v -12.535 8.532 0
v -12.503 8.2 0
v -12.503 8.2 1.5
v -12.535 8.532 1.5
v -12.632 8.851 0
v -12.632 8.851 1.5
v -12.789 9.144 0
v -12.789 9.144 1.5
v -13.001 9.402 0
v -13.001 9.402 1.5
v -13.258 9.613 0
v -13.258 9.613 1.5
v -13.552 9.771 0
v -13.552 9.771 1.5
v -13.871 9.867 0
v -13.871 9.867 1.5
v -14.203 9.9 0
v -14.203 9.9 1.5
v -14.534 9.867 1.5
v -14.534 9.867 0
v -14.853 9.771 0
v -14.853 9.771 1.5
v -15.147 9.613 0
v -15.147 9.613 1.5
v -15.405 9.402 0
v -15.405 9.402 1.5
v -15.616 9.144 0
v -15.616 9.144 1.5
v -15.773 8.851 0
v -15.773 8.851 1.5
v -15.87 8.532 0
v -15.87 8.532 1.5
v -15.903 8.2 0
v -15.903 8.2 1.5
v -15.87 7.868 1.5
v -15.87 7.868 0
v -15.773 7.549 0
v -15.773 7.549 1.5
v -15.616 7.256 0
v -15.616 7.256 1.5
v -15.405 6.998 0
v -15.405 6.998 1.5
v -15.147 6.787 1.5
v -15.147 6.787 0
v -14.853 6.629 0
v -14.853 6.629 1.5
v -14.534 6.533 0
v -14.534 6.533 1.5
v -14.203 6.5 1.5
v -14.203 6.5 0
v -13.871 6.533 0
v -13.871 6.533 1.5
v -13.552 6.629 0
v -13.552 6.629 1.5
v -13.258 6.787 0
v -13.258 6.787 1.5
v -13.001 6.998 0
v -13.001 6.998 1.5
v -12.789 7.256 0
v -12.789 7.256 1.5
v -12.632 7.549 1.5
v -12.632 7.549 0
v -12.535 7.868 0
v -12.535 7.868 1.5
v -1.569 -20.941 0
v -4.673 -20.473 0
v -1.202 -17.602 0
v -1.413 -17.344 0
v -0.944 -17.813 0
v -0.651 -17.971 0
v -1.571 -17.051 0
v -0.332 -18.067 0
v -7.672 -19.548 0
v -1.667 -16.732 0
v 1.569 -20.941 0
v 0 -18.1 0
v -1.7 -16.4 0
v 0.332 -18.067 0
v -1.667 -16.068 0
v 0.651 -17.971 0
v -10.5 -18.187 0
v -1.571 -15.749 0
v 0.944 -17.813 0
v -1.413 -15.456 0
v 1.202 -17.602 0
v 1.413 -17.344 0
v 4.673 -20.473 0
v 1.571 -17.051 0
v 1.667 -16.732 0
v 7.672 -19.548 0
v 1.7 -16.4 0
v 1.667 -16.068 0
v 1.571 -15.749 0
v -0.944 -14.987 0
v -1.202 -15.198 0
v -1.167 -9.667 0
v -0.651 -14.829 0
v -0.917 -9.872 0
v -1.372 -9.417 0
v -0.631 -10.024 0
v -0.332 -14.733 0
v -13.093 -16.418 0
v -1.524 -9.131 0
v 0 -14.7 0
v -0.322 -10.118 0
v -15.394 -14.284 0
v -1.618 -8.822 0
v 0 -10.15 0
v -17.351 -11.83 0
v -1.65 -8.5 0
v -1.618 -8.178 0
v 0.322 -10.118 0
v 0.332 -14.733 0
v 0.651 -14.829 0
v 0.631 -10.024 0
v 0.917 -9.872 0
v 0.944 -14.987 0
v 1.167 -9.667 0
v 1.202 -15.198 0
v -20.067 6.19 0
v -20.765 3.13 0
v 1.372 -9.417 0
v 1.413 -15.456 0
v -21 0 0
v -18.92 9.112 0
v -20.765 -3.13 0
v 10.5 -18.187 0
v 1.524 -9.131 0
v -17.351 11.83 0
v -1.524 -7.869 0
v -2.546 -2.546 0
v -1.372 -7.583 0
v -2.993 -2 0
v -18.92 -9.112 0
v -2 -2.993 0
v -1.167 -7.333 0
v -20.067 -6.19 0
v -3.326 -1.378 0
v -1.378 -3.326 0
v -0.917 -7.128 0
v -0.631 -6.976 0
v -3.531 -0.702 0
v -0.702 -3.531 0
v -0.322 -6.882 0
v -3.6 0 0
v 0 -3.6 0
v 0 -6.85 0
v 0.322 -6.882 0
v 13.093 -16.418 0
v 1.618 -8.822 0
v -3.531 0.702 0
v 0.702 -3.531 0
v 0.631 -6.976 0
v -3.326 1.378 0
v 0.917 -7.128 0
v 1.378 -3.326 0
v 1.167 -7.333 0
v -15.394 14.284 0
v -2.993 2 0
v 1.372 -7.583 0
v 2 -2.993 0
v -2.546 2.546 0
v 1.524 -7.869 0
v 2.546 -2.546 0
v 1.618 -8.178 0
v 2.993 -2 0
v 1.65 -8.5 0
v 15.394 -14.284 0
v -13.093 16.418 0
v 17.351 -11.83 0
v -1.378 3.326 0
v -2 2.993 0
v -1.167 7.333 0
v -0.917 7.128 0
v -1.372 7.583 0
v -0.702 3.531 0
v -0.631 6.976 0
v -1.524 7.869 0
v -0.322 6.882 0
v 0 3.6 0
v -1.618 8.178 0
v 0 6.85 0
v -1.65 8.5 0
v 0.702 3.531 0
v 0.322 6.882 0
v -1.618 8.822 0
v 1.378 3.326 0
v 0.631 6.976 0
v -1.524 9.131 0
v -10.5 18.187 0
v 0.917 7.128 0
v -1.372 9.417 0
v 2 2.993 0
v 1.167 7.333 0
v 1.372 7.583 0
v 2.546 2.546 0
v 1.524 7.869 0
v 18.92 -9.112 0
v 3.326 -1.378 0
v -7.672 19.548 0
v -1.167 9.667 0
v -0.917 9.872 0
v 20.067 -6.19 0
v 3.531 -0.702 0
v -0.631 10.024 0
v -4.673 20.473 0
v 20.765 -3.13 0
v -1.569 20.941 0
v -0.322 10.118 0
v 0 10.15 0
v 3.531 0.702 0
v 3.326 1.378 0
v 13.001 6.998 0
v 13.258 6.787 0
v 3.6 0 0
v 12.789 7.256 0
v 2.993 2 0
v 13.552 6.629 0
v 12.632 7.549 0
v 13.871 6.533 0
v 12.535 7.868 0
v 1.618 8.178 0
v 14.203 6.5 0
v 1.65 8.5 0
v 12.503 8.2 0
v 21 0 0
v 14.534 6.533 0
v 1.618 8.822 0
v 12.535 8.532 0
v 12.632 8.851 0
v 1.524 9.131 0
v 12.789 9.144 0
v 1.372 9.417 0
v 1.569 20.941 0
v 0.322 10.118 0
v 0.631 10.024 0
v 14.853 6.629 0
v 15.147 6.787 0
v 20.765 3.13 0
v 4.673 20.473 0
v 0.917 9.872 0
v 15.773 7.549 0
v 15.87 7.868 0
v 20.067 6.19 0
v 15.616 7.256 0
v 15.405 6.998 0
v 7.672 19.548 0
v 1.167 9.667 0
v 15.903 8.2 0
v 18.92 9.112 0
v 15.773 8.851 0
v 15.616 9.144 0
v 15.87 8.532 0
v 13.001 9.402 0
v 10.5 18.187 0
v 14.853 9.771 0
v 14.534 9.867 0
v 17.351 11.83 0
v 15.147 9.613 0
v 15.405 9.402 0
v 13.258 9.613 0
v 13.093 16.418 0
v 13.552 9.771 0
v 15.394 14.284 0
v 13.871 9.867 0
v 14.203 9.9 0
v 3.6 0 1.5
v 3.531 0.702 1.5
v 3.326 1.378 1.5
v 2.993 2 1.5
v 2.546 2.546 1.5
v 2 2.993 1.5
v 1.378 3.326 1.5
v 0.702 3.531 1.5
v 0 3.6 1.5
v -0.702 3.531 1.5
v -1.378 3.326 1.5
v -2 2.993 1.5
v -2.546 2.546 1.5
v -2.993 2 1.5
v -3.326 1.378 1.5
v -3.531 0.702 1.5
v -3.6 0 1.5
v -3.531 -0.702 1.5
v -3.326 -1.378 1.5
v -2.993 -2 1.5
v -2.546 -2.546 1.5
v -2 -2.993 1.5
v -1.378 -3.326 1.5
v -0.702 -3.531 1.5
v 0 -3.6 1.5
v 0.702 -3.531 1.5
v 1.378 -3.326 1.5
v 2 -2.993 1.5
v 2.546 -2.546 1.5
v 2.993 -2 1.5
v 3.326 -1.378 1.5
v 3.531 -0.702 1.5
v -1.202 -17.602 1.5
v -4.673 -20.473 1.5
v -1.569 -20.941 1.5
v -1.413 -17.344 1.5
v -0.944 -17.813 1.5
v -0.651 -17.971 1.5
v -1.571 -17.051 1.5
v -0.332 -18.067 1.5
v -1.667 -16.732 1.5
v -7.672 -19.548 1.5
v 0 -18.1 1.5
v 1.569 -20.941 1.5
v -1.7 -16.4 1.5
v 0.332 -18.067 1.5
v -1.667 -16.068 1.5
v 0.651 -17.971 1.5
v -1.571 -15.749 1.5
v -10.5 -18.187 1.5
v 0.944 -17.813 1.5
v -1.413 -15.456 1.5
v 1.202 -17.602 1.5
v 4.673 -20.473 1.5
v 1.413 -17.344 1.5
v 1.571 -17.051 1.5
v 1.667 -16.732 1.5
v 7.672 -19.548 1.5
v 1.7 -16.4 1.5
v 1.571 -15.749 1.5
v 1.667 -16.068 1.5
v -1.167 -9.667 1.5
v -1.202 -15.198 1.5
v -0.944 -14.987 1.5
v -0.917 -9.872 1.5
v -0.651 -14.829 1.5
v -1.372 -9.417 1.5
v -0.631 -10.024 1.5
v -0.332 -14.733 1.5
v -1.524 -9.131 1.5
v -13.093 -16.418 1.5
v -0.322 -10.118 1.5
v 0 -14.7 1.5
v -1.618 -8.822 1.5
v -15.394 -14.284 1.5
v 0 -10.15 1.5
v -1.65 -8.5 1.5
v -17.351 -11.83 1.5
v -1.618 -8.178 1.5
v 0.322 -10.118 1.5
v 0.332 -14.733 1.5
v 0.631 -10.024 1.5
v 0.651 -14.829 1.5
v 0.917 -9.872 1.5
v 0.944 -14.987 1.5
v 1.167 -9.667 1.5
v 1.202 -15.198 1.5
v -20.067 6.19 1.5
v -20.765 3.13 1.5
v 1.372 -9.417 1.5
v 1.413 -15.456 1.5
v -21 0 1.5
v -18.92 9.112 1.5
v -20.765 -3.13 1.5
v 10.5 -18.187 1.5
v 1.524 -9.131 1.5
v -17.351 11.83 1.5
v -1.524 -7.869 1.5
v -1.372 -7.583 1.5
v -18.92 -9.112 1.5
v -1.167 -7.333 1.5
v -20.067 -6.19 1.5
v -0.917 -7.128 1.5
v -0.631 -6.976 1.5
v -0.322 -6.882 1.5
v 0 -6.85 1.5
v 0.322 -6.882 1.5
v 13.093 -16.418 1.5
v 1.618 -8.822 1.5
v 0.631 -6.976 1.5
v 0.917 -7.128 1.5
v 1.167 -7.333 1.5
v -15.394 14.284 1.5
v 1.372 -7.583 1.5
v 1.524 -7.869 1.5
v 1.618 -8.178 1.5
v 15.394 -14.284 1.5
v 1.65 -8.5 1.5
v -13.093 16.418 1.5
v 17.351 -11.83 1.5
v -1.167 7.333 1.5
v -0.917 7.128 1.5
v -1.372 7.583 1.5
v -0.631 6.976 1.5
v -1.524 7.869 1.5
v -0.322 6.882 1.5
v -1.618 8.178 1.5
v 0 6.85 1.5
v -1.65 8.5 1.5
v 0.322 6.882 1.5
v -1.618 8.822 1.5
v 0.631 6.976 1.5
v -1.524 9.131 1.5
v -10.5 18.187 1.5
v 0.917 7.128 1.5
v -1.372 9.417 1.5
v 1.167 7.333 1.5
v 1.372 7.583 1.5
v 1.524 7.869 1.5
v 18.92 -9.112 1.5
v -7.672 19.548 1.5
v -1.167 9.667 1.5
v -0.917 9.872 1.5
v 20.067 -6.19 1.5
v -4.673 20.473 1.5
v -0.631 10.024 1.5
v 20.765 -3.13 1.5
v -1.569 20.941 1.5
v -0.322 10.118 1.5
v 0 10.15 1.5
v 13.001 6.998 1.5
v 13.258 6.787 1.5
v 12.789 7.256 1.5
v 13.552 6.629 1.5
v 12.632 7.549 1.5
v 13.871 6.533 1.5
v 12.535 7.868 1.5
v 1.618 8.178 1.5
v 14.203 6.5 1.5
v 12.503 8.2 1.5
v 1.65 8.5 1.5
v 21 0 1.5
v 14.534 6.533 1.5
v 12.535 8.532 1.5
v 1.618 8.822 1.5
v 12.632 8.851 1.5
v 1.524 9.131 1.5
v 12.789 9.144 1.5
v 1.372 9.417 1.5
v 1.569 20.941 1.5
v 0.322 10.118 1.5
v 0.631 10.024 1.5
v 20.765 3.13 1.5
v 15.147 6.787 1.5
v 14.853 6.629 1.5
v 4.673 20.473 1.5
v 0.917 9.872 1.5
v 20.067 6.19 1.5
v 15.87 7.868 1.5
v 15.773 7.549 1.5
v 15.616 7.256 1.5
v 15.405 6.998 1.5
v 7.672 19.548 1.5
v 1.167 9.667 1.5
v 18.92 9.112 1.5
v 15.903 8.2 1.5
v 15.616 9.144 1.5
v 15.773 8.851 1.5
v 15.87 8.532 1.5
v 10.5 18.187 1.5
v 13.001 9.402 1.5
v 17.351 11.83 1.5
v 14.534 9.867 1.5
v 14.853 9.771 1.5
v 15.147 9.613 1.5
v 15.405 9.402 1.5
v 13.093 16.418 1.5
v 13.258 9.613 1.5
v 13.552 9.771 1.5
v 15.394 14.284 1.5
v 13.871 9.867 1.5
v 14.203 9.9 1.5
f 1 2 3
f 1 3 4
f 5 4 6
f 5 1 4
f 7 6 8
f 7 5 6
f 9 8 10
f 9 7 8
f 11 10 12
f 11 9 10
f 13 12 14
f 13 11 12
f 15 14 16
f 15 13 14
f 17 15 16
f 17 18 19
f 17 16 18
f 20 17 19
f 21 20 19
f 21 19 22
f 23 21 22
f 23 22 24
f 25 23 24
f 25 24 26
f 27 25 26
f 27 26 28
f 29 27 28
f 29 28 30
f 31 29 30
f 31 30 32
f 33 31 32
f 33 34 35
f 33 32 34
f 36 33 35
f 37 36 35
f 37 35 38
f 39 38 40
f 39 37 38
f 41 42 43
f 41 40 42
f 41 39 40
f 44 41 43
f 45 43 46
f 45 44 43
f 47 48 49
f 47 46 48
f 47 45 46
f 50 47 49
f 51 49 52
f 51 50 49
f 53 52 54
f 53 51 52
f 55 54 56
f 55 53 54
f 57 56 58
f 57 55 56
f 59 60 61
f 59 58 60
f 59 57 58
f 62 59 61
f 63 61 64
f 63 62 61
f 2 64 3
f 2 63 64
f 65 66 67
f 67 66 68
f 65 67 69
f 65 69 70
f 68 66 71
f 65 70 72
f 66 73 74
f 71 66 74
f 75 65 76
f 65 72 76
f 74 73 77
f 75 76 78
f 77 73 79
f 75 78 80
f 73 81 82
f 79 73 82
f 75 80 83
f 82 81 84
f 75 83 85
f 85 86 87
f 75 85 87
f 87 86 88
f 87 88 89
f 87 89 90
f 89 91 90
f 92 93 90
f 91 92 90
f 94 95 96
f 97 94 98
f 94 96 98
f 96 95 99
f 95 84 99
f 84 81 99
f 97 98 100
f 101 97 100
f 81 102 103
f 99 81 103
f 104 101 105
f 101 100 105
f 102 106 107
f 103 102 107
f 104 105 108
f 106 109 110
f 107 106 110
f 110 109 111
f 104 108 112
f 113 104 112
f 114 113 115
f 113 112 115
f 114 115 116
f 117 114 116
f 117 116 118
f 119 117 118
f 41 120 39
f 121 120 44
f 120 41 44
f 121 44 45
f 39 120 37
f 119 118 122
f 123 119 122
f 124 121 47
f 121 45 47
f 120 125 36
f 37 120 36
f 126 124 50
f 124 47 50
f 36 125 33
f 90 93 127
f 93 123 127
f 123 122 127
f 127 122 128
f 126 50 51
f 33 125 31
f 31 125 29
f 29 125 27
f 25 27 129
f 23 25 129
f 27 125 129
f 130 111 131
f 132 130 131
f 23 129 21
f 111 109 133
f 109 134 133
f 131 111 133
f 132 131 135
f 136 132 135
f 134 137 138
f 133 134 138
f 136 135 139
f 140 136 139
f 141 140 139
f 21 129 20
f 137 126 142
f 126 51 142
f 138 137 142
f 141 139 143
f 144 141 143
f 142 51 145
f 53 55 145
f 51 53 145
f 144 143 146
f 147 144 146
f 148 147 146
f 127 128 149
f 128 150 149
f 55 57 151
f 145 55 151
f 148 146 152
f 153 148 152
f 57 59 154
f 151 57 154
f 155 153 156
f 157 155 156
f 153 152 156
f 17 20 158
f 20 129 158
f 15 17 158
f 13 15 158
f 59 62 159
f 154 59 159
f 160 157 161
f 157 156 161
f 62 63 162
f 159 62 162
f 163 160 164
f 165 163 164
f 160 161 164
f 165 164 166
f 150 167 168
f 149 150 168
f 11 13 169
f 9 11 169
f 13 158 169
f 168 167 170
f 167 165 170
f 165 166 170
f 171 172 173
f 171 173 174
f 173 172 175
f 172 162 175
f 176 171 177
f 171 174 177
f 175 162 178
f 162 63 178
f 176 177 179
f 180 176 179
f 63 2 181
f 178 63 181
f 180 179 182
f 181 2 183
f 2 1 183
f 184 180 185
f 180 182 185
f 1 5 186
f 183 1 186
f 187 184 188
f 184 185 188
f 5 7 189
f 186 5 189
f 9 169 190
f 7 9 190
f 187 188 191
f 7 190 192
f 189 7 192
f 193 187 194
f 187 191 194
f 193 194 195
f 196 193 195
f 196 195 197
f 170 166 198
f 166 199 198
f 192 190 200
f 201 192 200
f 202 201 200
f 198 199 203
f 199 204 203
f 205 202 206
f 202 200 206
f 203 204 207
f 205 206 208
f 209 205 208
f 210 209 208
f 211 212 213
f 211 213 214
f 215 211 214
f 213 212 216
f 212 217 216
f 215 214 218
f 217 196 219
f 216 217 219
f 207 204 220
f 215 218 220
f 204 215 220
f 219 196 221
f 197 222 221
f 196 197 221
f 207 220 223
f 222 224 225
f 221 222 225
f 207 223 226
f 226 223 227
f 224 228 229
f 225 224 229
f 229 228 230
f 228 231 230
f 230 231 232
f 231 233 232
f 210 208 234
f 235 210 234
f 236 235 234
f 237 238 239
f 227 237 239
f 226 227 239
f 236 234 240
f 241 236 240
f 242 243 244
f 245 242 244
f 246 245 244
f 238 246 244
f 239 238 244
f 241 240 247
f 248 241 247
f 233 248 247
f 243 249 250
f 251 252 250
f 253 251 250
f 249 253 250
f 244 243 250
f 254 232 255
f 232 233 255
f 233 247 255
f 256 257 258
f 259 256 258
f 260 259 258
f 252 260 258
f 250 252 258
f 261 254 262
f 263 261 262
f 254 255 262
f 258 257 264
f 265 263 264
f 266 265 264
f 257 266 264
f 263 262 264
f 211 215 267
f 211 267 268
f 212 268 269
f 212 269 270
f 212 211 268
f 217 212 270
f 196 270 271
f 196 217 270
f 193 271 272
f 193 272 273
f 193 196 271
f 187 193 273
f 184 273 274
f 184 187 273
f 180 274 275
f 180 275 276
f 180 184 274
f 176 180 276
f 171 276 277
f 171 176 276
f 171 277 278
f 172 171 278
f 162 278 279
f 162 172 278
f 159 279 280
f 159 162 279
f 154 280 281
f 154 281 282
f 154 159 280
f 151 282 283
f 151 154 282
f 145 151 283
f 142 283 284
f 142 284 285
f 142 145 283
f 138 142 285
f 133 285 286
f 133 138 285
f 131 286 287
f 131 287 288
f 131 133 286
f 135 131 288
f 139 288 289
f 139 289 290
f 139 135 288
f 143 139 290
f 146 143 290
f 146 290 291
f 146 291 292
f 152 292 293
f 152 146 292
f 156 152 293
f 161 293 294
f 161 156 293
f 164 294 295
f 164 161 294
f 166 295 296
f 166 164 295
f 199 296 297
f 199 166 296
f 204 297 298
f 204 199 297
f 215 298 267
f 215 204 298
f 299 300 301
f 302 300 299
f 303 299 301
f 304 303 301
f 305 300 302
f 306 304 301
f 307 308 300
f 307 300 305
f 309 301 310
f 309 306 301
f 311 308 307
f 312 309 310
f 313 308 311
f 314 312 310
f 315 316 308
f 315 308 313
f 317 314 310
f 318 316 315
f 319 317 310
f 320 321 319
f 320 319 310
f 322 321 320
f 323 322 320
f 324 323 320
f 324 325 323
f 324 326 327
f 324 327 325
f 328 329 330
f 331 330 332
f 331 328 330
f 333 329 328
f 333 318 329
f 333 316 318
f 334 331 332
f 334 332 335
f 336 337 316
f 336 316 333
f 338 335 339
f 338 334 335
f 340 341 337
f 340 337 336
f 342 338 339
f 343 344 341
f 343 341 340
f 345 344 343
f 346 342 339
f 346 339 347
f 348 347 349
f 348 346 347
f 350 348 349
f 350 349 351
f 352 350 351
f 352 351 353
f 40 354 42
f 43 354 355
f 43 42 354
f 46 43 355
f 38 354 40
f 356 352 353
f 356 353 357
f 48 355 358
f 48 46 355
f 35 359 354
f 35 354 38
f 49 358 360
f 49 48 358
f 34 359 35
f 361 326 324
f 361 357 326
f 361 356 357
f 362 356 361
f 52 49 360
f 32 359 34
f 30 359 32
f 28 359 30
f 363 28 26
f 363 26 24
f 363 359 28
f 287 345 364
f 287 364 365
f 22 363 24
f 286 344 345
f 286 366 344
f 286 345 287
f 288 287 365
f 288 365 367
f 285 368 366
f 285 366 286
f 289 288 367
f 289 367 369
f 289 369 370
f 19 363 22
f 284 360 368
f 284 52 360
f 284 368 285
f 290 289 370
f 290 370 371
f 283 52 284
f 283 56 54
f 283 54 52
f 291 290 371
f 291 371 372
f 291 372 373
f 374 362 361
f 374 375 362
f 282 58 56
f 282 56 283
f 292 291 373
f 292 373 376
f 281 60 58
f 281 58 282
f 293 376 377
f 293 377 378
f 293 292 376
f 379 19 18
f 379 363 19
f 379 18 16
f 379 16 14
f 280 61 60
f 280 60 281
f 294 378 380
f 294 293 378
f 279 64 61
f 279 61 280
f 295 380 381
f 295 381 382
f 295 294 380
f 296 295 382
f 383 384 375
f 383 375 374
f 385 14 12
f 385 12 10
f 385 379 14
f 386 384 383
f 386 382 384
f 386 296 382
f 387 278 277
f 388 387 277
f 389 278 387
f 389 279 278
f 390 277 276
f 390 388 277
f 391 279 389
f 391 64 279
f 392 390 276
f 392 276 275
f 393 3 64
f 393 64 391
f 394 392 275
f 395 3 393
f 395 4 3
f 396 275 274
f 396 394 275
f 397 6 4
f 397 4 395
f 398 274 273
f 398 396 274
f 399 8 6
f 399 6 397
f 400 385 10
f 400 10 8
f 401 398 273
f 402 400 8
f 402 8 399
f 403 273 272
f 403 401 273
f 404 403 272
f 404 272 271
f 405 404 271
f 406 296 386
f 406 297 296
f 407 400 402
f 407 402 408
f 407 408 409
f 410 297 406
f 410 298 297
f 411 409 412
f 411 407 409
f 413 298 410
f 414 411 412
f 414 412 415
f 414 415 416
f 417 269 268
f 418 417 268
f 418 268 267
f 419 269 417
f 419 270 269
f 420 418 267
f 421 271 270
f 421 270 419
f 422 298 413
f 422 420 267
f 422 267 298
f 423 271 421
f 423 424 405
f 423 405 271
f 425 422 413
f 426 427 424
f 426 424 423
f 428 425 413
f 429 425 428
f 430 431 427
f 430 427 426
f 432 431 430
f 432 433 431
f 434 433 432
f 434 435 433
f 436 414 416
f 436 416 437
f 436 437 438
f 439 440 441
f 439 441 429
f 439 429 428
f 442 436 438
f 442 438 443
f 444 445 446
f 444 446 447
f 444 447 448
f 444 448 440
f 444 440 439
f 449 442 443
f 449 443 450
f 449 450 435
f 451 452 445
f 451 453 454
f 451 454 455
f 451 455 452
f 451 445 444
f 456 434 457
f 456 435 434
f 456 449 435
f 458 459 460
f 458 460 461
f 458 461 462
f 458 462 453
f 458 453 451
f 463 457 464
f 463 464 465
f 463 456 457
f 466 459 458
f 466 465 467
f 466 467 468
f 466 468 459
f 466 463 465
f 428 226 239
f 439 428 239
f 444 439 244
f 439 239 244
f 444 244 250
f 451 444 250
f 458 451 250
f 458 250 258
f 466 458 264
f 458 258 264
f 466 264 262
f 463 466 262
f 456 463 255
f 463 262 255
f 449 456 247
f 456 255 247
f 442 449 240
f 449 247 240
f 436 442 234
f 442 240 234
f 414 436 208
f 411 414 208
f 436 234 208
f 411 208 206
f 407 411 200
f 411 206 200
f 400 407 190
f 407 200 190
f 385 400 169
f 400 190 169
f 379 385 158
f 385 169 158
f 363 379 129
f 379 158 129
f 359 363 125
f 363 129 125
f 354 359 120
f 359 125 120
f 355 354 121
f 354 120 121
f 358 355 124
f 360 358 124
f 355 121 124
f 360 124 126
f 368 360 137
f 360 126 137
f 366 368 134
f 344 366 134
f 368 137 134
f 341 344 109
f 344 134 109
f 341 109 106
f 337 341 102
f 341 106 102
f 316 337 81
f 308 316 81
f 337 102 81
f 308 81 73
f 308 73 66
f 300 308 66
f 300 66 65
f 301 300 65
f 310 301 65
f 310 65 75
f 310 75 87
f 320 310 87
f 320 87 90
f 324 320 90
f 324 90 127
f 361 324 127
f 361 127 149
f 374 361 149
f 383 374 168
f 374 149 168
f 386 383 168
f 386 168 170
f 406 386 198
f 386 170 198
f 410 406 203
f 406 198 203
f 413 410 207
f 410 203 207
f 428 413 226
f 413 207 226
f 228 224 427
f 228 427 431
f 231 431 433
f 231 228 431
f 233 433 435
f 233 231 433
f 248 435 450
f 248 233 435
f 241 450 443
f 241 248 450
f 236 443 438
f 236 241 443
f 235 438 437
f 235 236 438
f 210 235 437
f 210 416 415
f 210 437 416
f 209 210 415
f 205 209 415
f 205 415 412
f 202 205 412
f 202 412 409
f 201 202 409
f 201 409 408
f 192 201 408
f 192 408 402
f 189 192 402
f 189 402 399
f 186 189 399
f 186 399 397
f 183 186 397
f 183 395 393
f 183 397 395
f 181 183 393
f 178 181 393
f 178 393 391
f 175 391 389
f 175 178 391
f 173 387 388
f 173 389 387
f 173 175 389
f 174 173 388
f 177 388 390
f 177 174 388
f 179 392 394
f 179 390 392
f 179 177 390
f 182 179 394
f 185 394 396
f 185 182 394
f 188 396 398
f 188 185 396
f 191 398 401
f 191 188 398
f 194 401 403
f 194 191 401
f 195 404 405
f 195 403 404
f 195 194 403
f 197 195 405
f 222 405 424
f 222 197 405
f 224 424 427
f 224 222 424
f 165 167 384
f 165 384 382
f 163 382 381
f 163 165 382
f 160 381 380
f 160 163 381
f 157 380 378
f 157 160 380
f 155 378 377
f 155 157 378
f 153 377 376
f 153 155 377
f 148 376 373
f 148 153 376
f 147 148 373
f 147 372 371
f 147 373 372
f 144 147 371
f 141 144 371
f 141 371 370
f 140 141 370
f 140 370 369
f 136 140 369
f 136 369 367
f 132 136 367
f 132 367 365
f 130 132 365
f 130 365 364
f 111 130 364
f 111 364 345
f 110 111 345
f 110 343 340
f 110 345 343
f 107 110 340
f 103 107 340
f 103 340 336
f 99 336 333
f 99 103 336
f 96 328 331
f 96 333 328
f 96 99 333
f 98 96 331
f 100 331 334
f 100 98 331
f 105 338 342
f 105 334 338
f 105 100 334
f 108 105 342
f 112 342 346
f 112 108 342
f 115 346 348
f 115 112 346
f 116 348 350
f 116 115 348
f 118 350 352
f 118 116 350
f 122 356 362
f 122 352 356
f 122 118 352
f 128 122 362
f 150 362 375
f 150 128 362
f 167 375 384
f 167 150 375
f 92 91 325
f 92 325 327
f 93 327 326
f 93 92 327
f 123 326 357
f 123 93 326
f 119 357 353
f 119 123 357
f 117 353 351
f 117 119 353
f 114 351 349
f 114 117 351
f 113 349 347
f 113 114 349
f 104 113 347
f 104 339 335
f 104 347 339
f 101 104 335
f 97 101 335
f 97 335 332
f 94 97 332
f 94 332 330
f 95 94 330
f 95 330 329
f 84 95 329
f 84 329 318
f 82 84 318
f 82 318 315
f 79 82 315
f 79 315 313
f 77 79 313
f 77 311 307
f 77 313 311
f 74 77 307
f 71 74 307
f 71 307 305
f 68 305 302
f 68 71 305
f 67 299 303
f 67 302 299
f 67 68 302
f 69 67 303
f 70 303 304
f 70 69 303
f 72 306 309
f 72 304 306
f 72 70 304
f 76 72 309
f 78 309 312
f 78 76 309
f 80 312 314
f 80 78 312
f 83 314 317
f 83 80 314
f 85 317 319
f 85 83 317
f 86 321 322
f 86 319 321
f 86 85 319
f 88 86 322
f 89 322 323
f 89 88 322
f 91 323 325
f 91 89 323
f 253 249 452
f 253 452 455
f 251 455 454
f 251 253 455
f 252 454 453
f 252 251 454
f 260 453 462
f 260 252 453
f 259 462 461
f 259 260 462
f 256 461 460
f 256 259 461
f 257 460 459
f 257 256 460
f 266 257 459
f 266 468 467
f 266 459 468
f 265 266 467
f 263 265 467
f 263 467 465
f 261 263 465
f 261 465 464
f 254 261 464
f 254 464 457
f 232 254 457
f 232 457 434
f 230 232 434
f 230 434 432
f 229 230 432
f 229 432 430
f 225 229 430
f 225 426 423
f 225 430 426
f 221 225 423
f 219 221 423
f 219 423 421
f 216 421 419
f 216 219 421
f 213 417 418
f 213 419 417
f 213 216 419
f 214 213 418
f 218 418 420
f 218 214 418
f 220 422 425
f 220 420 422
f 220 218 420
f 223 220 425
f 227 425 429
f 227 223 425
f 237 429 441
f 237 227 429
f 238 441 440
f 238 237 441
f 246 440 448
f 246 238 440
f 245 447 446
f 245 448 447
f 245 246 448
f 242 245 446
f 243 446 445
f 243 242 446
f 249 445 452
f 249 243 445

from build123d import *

# Parameters (mm, degrees)
S01_FLAT_1_5_MM_STEEL_DISC_AND_GEARBOX_R       = 21
S01_FLAT_1_5_MM_STEEL_DISC_AND_GEARBOX_R_2     = 3.6
F_01_FLAT_1_5_MM_STEEL_DISC_AND_GEARBOX_DEPTH  = 1.5
F_02_START                                     = -0.1
S02_THREE_CARRIER_BOLTS_R                      = 1.7
F_02_THREE_CARRIER_BOLTS_DEPTH                 = 1.7
F_03_START                                     = -0.1
S03_TWO_POLOLU_FACE_SCREWS_AT_17_MM_PI_R       = 1.65
F_03_TWO_POLOLU_FACE_SCREWS_AT_17_MM_PIT_DEPTH = 1.7


with BuildPart() as part:
    # S01 - Flat 1.5 mm steel disc and gearbox pilot → 01 - Flat 1.5 mm steel disc and gearbox pilot (new body)
    with BuildSketch(Plane.XY):
        Circle(S01_FLAT_1_5_MM_STEEL_DISC_AND_GEARBOX_R)
        Circle(S01_FLAT_1_5_MM_STEEL_DISC_AND_GEARBOX_R_2, mode=Mode.SUBTRACT)
    extrude(amount=F_01_FLAT_1_5_MM_STEEL_DISC_AND_GEARBOX_DEPTH)

    # S02 - Three carrier bolts → 02 - Three carrier bolts (cut)
    with BuildSketch(Plane.XY.offset(F_02_START)):
        with Locations((14.202816622, 8.2)):
            Circle(S02_THREE_CARRIER_BOLTS_R)
        with Locations((-14.202816622, 8.2)):
            Circle(S02_THREE_CARRIER_BOLTS_R)
        with Locations((0, -16.4)):
            Circle(S02_THREE_CARRIER_BOLTS_R)
    extrude(amount=F_02_THREE_CARRIER_BOLTS_DEPTH, mode=Mode.SUBTRACT)

    # S03 - Two Pololu face screws at 17 mm pitch → 03 - Two Pololu face screws at 17 mm pitch (cut)
    with BuildSketch(Plane.XY.offset(F_03_START)):
        with Locations((0, 8.5)):
            Circle(S03_TWO_POLOLU_FACE_SCREWS_AT_17_MM_PI_R)
        with Locations((0, -8.5)):
            Circle(S03_TWO_POLOLU_FACE_SCREWS_AT_17_MM_PI_R)
    extrude(amount=F_03_TWO_POLOLU_FACE_SCREWS_AT_17_MM_PIT_DEPTH, mode=Mode.SUBTRACT)


solid = part.part
